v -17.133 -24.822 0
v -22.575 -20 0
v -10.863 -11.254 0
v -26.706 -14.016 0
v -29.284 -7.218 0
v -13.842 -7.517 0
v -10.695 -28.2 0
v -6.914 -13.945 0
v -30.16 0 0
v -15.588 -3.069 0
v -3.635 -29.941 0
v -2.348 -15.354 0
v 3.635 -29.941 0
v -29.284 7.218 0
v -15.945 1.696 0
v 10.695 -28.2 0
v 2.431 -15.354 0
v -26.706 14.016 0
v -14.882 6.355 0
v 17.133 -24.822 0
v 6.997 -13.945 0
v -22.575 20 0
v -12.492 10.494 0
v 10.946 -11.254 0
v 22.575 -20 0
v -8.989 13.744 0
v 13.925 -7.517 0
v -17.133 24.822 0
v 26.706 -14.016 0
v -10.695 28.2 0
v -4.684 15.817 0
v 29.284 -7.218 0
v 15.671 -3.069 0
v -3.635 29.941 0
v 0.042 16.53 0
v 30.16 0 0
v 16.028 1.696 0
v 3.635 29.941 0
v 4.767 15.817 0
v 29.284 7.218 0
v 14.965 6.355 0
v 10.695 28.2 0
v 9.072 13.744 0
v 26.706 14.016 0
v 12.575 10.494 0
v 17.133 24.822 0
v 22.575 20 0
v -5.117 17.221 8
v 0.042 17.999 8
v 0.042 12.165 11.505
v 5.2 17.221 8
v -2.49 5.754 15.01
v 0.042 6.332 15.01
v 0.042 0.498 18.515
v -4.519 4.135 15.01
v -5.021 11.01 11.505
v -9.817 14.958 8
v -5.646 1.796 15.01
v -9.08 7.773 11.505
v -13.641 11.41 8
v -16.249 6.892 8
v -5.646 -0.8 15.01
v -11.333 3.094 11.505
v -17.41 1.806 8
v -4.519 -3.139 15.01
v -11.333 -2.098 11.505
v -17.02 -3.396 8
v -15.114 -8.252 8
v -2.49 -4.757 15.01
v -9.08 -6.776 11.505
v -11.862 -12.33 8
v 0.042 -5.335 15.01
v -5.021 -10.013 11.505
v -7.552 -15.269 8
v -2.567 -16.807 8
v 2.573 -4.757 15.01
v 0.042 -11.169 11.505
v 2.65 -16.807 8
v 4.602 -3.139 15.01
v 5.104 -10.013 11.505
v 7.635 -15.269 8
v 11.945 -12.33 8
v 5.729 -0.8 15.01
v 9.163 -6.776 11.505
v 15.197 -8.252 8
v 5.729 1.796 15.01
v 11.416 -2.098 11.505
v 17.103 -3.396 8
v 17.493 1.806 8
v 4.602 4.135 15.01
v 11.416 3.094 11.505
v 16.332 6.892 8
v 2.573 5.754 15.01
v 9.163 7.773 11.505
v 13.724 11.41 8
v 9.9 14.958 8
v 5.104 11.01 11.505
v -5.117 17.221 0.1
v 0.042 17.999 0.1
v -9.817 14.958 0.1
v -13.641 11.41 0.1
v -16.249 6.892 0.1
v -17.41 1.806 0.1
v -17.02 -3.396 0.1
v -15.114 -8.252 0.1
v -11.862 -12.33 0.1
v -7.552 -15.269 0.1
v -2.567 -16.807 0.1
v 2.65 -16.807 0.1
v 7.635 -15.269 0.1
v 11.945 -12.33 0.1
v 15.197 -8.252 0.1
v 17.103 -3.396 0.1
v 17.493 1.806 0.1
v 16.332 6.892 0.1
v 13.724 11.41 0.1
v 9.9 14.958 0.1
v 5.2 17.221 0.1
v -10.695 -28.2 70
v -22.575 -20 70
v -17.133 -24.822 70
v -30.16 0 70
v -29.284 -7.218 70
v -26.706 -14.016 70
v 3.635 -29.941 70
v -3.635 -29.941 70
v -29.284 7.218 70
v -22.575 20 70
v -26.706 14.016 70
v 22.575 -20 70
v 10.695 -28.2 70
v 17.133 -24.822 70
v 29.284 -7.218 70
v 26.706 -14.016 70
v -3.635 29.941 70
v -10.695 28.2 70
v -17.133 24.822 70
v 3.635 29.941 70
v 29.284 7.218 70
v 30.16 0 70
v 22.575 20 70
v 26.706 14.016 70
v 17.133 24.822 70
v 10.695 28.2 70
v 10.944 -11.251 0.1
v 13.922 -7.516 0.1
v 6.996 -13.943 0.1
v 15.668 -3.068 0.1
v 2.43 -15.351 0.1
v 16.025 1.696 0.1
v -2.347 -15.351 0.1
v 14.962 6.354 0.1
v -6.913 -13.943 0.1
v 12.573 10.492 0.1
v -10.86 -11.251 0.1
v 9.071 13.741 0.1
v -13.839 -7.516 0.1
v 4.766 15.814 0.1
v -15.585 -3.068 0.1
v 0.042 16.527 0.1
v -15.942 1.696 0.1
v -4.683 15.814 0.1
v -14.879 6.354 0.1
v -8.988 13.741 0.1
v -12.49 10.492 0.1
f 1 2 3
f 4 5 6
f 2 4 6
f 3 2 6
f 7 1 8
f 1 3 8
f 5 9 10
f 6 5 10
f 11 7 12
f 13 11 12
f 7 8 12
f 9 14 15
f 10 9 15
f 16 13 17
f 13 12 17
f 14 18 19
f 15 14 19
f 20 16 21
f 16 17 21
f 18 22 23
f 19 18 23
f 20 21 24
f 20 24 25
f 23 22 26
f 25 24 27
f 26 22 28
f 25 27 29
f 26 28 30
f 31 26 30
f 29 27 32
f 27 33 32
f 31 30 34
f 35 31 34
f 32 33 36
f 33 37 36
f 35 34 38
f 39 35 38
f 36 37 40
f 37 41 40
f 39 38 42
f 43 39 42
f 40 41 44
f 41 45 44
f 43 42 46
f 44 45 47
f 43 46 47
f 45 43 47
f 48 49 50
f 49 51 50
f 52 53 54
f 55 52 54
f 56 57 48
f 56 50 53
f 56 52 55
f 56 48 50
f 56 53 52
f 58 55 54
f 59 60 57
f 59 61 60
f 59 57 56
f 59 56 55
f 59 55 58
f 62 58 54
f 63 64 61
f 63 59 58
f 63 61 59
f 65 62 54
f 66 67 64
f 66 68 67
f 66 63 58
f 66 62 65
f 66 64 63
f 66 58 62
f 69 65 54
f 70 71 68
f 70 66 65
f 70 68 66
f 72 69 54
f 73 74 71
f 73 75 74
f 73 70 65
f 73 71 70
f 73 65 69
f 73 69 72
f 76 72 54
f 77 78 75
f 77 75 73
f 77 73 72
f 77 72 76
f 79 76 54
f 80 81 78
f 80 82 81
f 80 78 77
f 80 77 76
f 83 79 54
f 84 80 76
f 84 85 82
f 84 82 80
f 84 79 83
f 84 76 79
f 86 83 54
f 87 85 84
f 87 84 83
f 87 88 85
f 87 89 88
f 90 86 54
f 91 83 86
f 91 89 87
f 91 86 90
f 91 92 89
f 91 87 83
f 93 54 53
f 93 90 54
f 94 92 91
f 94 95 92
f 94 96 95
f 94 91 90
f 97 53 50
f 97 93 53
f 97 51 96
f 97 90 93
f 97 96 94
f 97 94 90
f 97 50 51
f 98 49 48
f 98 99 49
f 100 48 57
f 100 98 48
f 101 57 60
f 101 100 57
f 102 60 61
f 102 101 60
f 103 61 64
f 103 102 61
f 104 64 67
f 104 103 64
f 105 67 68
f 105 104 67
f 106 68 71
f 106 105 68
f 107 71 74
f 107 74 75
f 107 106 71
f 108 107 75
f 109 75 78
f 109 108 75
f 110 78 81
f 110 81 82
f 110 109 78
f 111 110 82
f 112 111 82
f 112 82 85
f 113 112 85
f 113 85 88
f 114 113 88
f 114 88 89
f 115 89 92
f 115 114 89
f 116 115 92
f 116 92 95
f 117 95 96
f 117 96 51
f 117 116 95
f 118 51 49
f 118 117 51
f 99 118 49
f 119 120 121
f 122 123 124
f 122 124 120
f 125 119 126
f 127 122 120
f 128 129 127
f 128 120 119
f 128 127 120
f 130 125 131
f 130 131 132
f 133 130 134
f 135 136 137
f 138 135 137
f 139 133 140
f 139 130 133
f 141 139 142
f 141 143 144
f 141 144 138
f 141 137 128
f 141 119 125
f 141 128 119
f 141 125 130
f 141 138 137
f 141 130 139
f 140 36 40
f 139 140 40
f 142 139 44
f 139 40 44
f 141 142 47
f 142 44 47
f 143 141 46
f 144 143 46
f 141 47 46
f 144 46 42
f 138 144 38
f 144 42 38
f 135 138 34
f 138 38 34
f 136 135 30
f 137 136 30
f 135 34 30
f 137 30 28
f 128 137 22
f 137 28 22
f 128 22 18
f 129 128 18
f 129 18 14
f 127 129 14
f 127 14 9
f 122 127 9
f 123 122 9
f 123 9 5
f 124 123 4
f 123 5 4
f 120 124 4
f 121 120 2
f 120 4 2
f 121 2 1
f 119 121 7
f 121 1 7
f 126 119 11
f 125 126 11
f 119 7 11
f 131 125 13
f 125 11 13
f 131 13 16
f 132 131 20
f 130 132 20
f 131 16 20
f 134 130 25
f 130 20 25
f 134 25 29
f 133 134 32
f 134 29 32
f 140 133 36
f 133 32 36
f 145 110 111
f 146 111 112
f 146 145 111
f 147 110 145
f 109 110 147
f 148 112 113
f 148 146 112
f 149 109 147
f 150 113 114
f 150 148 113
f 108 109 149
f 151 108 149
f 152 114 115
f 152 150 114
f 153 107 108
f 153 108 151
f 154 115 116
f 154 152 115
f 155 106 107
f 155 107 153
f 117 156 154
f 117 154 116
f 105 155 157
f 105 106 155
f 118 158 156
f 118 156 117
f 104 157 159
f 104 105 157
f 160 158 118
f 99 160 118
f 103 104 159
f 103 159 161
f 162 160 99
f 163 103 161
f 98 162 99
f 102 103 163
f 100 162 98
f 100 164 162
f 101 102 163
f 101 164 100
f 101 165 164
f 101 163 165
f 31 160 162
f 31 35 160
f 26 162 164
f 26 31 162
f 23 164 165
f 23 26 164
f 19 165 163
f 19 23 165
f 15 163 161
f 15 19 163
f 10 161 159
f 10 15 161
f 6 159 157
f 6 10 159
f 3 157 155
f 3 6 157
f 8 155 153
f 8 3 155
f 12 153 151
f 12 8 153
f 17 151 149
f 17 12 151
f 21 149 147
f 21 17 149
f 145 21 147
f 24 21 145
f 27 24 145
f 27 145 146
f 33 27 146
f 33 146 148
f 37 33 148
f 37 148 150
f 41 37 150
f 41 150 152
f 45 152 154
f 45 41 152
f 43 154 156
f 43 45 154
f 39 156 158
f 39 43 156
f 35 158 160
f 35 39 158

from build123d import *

# Parameters (mm, degrees)
ESQUISSE1_R        = 30.160422997
BOSS_EXTRU_1_DEPTH = 70


with BuildPart() as part:
    # Esquisse1 → Boss.-Extru.1 (new body)
    with BuildSketch(Plane.XY):
        Circle(ESQUISSE1_R)
    extrude(amount=BOSS_EXTRU_1_DEPTH)

    # Esquisse10 → Trou taraudé 1 Rc1 (revolve, cut)
    with BuildSketch(Plane(origin=(0.041525869, 0.498310425, 0), x_dir=(0, 1, 0), z_dir=(1, 0, 0))):
        Polygon((0, 0), (0, 18.515361263), (17.5005, 8), (17.5005, 0.1), (16.028262338, 0.1), (16.031384, 0), align=None)
    revolve(axis=Axis((0.041525869, 0.498310425, -6.35), (0, 0, 1)), mode=Mode.SUBTRACT)


solid = part.part
